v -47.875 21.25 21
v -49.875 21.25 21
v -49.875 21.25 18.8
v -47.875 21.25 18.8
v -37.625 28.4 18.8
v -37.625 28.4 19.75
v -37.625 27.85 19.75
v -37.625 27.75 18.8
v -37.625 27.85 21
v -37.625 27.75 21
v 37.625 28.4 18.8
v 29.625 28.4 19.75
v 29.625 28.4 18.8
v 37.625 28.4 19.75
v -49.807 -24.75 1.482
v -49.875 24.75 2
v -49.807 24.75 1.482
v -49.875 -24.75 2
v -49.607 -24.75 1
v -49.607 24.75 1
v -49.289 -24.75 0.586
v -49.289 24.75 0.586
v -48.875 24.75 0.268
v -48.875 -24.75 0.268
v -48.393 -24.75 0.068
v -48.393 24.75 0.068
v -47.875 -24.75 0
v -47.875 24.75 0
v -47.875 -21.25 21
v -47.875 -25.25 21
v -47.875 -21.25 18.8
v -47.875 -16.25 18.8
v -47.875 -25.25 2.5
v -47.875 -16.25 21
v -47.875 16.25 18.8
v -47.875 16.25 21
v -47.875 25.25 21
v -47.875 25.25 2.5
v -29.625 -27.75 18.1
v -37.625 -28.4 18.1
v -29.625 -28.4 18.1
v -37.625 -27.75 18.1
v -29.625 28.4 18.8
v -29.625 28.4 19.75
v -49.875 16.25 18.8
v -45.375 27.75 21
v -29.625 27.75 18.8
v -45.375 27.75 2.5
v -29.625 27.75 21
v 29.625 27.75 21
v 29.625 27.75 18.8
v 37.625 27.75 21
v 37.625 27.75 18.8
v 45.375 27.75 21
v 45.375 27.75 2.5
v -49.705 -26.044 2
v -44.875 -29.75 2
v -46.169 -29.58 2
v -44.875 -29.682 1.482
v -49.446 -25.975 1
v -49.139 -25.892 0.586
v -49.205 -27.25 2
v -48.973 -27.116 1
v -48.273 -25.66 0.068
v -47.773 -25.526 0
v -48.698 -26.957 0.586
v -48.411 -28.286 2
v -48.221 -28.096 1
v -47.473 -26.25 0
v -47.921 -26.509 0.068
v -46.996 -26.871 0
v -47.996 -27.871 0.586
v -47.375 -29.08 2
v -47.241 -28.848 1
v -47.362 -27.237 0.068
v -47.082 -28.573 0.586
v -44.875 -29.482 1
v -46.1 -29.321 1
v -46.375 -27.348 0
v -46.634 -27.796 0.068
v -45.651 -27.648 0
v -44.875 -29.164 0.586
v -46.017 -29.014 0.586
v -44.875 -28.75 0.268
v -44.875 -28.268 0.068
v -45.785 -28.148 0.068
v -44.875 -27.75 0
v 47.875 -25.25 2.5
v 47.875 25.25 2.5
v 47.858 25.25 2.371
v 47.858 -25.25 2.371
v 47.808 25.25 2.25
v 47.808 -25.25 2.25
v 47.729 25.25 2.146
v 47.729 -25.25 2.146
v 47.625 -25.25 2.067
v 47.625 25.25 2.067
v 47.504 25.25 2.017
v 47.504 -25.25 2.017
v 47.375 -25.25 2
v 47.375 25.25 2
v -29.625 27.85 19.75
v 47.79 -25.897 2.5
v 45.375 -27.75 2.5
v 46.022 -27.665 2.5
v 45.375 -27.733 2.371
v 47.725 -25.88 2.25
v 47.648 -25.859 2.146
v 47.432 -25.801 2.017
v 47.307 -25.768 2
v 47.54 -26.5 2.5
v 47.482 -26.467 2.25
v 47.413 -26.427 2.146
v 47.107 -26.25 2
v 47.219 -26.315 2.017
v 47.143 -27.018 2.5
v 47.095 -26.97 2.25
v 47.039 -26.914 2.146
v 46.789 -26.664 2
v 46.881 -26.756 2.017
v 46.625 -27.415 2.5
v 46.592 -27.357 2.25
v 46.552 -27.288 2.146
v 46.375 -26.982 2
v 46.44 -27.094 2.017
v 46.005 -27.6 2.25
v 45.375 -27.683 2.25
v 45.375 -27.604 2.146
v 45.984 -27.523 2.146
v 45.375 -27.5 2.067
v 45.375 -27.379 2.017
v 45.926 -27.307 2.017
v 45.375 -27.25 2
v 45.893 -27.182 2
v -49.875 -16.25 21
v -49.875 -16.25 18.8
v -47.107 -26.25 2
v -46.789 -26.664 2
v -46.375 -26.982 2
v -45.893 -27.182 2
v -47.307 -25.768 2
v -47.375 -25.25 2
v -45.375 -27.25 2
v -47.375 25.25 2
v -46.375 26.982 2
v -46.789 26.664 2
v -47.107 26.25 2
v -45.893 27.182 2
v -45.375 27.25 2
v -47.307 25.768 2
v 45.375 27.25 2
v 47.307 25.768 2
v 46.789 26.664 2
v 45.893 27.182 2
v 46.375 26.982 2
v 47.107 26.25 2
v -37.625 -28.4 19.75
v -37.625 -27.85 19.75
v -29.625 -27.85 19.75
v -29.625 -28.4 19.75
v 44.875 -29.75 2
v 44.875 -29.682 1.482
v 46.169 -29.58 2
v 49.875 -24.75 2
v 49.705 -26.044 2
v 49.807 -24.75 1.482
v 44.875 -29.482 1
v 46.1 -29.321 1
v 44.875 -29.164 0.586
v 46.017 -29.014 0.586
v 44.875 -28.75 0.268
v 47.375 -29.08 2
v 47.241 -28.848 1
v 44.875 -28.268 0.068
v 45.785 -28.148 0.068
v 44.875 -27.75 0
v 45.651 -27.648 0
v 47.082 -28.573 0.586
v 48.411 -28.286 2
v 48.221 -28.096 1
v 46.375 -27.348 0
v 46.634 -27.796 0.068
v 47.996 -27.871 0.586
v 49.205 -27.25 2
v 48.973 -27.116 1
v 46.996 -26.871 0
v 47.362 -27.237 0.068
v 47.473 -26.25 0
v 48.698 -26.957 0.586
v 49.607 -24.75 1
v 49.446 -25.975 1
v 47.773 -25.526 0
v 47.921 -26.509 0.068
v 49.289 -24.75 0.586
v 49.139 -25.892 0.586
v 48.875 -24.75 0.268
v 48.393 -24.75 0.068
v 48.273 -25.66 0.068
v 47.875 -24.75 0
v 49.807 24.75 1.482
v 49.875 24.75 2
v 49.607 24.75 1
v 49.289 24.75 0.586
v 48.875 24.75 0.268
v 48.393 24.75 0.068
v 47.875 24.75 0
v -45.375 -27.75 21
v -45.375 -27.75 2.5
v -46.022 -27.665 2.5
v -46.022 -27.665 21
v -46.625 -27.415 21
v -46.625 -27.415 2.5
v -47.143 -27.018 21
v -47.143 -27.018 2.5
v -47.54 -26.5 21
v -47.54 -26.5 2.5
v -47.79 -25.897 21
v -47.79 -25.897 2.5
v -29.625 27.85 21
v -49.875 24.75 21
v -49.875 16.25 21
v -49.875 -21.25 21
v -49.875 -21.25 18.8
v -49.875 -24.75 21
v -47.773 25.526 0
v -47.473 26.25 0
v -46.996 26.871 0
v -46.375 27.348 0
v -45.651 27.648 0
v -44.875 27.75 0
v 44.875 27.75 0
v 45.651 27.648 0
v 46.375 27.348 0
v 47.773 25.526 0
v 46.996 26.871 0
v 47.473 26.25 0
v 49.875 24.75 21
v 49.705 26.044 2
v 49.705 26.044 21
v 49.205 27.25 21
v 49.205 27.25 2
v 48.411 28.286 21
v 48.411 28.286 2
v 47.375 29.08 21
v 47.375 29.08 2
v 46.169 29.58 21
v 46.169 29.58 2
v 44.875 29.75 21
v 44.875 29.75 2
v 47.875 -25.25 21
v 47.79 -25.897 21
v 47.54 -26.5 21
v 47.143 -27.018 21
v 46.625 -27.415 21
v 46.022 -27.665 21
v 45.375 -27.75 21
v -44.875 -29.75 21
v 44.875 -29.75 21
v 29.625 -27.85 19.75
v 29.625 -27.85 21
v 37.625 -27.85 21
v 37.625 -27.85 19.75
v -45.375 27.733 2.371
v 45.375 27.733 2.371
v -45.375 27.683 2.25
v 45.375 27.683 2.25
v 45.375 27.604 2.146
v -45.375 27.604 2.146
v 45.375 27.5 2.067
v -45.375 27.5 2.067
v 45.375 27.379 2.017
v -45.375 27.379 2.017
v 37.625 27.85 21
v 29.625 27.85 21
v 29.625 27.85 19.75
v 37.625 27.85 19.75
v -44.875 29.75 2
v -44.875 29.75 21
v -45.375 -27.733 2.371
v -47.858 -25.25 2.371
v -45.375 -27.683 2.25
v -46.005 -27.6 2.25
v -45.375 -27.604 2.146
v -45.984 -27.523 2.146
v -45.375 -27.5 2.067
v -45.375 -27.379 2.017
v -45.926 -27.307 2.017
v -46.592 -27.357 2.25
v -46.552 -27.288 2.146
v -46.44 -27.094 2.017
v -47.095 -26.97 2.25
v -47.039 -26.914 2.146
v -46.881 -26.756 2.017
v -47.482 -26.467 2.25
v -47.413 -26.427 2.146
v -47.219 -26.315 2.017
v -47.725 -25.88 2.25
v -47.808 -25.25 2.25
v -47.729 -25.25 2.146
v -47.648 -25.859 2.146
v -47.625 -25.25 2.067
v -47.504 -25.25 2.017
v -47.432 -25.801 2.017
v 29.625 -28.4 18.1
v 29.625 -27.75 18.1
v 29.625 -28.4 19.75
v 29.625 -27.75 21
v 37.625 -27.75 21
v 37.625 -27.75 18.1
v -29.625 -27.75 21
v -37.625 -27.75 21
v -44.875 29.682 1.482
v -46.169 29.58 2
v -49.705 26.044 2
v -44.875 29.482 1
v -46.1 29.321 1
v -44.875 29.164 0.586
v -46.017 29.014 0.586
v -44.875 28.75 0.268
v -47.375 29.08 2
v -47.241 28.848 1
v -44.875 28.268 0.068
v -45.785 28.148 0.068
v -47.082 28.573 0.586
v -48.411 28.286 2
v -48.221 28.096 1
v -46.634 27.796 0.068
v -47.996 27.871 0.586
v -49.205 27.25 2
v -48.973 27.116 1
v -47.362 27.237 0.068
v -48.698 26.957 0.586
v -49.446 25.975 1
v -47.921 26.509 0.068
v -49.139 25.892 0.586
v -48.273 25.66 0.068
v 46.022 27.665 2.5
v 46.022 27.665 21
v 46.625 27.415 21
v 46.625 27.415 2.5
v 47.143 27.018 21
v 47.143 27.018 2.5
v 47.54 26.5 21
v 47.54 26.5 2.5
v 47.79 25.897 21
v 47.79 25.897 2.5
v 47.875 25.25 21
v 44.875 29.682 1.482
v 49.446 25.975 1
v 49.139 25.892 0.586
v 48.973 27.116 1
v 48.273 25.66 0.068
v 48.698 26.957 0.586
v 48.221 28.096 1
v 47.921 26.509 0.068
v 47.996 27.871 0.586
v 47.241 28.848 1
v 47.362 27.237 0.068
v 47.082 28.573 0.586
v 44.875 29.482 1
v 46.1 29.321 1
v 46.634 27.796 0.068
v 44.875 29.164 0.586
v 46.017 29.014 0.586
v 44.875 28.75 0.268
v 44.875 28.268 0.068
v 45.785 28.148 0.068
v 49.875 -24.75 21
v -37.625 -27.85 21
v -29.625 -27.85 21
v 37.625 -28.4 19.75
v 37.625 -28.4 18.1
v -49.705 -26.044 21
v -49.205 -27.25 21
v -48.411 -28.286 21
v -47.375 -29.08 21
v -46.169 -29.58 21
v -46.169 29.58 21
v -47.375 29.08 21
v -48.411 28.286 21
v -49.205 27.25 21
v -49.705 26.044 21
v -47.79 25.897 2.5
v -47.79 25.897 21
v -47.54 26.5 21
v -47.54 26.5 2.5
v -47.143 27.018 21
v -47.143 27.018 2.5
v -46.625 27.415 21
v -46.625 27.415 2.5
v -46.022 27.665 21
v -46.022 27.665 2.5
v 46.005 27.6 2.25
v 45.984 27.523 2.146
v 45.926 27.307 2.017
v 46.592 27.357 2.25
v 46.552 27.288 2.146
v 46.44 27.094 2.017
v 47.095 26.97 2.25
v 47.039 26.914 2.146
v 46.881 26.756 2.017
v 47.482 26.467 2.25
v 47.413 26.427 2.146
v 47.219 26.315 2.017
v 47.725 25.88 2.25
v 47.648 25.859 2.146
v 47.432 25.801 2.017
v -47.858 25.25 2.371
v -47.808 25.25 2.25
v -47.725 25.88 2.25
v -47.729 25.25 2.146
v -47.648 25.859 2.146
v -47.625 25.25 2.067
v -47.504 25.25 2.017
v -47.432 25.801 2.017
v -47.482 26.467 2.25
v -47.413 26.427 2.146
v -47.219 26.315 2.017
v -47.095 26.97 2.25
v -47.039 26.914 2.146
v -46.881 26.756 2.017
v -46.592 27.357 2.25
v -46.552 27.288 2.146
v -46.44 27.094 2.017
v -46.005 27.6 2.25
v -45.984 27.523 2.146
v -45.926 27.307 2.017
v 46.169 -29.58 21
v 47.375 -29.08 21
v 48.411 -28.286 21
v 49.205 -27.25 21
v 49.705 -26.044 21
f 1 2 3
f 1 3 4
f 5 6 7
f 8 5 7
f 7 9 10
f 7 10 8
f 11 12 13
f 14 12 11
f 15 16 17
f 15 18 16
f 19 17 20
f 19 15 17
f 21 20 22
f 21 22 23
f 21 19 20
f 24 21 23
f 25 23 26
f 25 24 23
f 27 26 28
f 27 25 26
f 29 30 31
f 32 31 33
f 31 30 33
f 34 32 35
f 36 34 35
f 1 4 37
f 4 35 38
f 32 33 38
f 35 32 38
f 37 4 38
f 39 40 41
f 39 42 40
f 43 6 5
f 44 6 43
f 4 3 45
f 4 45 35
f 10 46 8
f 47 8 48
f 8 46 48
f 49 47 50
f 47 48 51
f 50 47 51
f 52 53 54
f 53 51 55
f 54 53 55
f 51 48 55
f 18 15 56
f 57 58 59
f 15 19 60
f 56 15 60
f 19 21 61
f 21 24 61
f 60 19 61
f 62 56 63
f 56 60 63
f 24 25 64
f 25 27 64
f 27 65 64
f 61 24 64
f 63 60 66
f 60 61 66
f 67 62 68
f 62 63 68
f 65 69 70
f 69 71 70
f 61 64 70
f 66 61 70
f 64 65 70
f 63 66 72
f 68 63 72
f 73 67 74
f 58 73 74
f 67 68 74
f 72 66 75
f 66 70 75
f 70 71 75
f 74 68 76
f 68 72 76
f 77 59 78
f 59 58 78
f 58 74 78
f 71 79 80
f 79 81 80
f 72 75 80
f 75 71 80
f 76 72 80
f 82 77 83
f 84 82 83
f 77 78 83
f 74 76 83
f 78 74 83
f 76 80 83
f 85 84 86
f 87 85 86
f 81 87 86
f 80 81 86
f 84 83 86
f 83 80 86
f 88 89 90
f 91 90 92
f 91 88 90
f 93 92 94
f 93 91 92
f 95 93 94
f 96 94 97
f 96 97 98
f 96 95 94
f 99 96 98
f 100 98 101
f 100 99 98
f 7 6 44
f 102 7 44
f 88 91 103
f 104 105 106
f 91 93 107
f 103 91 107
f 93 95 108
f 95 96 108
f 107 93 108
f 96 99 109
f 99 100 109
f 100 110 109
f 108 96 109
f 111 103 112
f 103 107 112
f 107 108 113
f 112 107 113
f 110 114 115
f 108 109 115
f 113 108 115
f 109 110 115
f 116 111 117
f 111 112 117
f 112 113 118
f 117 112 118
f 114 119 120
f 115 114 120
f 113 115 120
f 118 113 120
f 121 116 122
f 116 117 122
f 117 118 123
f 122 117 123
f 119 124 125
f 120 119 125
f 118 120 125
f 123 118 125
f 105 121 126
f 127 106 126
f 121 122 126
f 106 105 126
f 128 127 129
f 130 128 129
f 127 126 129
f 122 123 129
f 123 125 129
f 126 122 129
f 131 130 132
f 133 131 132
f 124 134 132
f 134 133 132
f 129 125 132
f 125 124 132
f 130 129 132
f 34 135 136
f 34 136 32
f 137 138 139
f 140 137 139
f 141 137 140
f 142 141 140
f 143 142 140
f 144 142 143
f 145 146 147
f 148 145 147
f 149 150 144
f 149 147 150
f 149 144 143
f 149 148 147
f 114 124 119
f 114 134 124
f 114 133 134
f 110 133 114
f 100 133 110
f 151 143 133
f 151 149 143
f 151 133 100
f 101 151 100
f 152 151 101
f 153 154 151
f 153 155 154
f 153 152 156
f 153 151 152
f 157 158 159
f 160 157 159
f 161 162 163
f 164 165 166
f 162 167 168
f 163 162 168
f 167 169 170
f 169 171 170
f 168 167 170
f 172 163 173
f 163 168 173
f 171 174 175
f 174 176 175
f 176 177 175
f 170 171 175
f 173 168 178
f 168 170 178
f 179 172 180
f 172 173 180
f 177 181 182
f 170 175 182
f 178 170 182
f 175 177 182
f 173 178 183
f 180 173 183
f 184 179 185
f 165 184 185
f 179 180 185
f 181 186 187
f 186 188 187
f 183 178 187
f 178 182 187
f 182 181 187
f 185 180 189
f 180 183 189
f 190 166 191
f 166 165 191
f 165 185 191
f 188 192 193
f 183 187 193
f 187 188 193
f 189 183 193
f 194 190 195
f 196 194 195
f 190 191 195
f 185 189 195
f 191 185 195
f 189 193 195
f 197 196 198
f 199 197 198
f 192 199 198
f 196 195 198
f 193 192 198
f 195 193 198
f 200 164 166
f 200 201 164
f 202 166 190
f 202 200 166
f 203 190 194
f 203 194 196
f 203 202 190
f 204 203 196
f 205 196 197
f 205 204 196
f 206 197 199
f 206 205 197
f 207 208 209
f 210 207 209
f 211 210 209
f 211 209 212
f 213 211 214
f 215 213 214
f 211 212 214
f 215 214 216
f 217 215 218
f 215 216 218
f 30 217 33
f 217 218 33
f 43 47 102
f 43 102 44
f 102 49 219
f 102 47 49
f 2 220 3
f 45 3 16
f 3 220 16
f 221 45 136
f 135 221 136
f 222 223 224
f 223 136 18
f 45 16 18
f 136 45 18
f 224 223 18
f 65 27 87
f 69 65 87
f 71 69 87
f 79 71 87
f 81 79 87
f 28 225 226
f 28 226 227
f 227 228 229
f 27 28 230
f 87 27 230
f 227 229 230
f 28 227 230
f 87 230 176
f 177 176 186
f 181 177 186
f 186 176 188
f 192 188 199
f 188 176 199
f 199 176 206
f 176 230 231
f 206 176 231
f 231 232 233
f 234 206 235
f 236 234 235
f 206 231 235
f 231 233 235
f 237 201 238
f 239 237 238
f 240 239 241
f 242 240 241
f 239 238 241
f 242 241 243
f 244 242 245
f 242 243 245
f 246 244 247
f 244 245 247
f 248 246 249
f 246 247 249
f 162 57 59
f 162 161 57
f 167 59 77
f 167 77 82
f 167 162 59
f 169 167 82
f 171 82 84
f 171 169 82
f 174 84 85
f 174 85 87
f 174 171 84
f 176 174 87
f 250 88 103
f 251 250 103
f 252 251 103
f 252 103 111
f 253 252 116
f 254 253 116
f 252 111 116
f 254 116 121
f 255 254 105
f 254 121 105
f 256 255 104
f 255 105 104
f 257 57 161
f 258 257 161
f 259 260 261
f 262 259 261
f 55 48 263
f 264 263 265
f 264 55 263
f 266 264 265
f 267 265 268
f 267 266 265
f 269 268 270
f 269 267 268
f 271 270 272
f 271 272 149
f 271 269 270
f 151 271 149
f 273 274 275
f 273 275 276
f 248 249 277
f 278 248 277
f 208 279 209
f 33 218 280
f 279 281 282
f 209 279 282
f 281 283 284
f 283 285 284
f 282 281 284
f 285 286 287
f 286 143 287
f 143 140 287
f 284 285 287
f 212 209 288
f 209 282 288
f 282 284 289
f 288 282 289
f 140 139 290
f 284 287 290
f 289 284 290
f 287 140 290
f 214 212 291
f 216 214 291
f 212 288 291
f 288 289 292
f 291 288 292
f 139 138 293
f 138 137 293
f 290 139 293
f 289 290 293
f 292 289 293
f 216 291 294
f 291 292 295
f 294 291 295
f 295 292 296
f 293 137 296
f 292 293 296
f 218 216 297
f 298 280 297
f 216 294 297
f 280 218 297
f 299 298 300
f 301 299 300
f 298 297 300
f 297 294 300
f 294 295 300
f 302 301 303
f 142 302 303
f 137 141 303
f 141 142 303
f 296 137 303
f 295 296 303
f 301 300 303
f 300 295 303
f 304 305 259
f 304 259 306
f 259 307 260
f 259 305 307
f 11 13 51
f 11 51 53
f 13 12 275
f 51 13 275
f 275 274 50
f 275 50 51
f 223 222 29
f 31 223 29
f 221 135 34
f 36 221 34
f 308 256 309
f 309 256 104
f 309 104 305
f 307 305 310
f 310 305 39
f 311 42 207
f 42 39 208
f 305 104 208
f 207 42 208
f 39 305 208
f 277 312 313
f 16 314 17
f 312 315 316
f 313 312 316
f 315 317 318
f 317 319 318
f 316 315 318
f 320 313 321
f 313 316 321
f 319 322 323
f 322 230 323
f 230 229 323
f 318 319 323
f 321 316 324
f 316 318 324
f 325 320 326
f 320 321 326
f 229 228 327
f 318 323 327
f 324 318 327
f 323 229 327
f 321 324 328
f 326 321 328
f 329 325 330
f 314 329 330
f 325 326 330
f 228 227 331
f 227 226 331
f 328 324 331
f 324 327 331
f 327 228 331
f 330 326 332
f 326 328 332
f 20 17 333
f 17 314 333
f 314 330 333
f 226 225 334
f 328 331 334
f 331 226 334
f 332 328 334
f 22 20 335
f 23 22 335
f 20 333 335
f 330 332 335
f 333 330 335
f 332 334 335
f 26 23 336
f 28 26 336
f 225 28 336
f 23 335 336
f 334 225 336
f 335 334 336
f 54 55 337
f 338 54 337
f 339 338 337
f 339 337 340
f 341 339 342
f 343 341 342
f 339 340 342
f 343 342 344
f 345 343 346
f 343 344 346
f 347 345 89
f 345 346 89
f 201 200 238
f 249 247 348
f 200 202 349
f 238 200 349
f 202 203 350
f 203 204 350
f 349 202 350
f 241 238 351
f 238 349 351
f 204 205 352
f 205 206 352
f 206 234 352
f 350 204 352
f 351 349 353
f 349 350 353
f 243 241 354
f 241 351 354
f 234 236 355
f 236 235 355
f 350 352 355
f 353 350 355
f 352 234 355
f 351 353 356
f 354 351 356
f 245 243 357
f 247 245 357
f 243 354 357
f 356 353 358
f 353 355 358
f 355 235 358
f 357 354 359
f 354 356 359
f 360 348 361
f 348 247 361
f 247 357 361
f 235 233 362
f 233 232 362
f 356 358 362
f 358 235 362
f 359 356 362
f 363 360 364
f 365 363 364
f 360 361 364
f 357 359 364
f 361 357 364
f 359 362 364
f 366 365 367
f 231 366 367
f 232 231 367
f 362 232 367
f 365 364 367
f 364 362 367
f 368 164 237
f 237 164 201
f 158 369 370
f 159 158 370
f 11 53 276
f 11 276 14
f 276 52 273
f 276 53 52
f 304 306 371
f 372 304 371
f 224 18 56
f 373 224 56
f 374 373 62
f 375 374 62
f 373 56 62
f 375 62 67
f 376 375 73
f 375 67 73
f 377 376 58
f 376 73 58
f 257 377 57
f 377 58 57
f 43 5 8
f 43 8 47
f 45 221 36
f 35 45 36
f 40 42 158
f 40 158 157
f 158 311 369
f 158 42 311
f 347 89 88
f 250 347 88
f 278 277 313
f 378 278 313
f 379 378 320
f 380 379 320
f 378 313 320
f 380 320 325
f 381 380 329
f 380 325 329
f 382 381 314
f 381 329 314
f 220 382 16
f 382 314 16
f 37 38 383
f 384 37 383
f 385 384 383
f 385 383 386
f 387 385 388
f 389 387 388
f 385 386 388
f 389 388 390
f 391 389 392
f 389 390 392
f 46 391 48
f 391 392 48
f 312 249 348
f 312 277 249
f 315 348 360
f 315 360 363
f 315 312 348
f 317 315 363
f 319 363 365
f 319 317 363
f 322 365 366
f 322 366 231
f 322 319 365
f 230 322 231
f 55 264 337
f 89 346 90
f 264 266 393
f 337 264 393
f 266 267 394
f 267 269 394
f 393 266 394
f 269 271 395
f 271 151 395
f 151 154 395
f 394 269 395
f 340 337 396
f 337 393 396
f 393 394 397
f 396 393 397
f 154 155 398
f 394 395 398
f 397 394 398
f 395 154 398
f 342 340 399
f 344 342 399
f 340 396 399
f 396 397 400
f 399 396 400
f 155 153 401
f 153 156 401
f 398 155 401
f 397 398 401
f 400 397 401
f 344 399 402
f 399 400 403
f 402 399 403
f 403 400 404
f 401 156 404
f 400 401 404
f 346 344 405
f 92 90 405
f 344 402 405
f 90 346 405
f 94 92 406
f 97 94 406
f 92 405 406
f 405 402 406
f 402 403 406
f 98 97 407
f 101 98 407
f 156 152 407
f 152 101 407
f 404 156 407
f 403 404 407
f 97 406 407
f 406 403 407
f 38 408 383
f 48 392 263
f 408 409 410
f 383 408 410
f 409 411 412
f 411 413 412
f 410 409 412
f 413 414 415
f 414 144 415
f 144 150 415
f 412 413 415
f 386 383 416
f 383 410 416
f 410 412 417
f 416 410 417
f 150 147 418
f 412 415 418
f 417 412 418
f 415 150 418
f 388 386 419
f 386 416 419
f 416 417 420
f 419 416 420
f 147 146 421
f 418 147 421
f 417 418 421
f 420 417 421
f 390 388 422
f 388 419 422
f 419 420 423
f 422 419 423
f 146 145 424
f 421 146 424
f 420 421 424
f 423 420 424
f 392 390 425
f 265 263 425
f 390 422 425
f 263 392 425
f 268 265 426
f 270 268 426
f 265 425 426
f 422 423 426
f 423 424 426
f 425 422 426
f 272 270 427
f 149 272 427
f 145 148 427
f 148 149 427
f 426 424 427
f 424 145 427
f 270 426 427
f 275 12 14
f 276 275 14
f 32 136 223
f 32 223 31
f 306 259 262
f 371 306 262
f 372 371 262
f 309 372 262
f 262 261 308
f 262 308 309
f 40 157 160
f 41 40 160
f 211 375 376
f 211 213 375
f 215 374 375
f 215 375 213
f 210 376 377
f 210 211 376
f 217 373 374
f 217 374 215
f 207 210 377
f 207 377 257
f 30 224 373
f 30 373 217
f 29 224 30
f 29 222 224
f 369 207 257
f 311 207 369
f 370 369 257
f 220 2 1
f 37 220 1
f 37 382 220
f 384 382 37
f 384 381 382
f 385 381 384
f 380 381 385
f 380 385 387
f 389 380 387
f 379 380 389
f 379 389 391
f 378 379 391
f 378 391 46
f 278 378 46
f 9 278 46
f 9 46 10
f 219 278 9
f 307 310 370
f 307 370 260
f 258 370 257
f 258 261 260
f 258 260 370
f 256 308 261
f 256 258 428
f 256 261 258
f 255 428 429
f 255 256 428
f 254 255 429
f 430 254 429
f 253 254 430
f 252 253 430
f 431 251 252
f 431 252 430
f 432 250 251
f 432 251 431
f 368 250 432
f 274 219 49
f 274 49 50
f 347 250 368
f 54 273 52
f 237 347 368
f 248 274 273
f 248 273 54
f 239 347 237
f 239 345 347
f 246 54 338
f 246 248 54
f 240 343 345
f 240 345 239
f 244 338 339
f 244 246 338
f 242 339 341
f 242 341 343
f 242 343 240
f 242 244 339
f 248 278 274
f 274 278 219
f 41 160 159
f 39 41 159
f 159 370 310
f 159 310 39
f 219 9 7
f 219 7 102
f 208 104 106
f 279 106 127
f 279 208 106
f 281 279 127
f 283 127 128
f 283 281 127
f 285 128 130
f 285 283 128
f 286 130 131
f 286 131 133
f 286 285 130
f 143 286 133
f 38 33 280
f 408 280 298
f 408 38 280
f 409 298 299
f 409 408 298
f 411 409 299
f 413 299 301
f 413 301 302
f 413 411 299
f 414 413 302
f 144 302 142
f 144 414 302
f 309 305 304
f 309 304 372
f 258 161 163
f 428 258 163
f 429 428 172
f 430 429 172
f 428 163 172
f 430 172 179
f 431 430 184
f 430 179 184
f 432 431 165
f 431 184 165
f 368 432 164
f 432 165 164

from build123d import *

# Parameters (mm, degrees)
F1_DEPTH = 2
F2_DEPTH = 21
F3_R     = 2
F4_W     = 2
F4_H     = 5
F4_W_2   = 8
F4_H_2   = 0.55
F4_H_3   = 0.1
F5_DEPTH = 2.2
F6_R     = 0.5
F7_DEPTH = 2.9
F8_DEPTH = 1.25


with BuildPart() as f1:
    # F0 (on Top) → F1 (new body)
    with BuildSketch(Plane.XY):
        with BuildLine():
            Line((-44.875, -29.75), (44.875, -29.75))
            ThreePointArc((44.875, -29.75), (48.4105339059, -28.2855339059), (49.875, -24.75))
            Line((49.875, -24.75), (49.875, 24.75))
            ThreePointArc((49.875, 24.75), (48.4105339059, 28.2855339059), (44.875, 29.75))
            Line((44.875, 29.75), (-44.875, 29.75))
            ThreePointArc((-44.875, 29.75), (-48.4105339059, 28.2855339059), (-49.875, 24.75))
            Line((-49.875, 24.75), (-49.875, -24.75))
            ThreePointArc((-49.875, -24.75), (-48.4105339059, -28.2855339059), (-44.875, -29.75))
        make_face()
        with BuildLine():
            ThreePointArc((47.875, -25.25), (47.142766953, -27.017766953), (45.375, -27.75))
            Line((45.375, -27.75), (-45.375, -27.75))
            ThreePointArc((-45.375, -27.75), (-47.142766953, -27.017766953), (-47.875, -25.25))
            Line((-47.875, -25.25), (-47.875, 25.25))
            ThreePointArc((-47.875, 25.25), (-47.142766953, 27.017766953), (-45.375, 27.75))
            Line((-45.375, 27.75), (45.375, 27.75))
            ThreePointArc((45.375, 27.75), (47.142766953, 27.017766953), (47.875, 25.25))
            Line((47.875, 25.25), (47.875, -25.25))
        make_face(mode=Mode.SUBTRACT)
        with BuildLine():
            Line((-45.375, -27.75), (45.375, -27.75))
            ThreePointArc((45.375, -27.75), (47.142766953, -27.017766953), (47.875, -25.25))
            Line((47.875, -25.25), (47.875, 25.25))
            ThreePointArc((47.875, 25.25), (47.142766953, 27.017766953), (45.375, 27.75))
            Line((45.375, 27.75), (-45.375, 27.75))
            ThreePointArc((-45.375, 27.75), (-47.142766953, 27.017766953), (-47.875, 25.25))
            Line((-47.875, 25.25), (-47.875, -25.25))
            ThreePointArc((-47.875, -25.25), (-47.142766953, -27.017766953), (-45.375, -27.75))
        make_face()
    extrude(amount=F1_DEPTH)

    # F0 (on Top) → F2 (join)
    with BuildSketch(Plane.XY):
        with BuildLine():
            Line((-44.875, -29.75), (44.875, -29.75))
            ThreePointArc((44.875, -29.75), (48.4105339059, -28.2855339059), (49.875, -24.75))
            Line((49.875, -24.75), (49.875, 24.75))
            ThreePointArc((49.875, 24.75), (48.4105339059, 28.2855339059), (44.875, 29.75))
            Line((44.875, 29.75), (-44.875, 29.75))
            ThreePointArc((-44.875, 29.75), (-48.4105339059, 28.2855339059), (-49.875, 24.75))
            Line((-49.875, 24.75), (-49.875, -24.75))
            ThreePointArc((-49.875, -24.75), (-48.4105339059, -28.2855339059), (-44.875, -29.75))
        make_face()
        with BuildLine():
            ThreePointArc((47.875, -25.25), (47.142766953, -27.017766953), (45.375, -27.75))
            Line((45.375, -27.75), (-45.375, -27.75))
            ThreePointArc((-45.375, -27.75), (-47.142766953, -27.017766953), (-47.875, -25.25))
            Line((-47.875, -25.25), (-47.875, 25.25))
            ThreePointArc((-47.875, 25.25), (-47.142766953, 27.017766953), (-45.375, 27.75))
            Line((-45.375, 27.75), (45.375, 27.75))
            ThreePointArc((45.375, 27.75), (47.142766953, 27.017766953), (47.875, 25.25))
            Line((47.875, 25.25), (47.875, -25.25))
        make_face(mode=Mode.SUBTRACT)
    extrude(amount=F2_DEPTH)

    # F3
    f3_edges = [f1.edges().sort_by_distance(p)[0] for p in [
        (0, -29.75, 0),
        (-48.410534, -28.285534, 0),
        (-49.875, 0, 0),
        (-48.410534, 28.285534, 0),
        (0, 29.75, 0),
        (48.410534, 28.285534, 0),
        (49.875, 0, 0),
        (48.410534, -28.285534, 0),
    ]]
    fillet(f3_edges, radius=F3_R)

    # F4 (on face) → F5 (cut)
    with BuildSketch(Plane.XY.offset(21)):
        with Locations((-48.875, -18.75)):
            Rectangle(F4_W, F4_H)
        with Locations((-48.875, 18.75)):
            Rectangle(F4_W, F4_H)
        with Locations((-33.625, 28.125)):
            Rectangle(F4_W_2, F4_H_2)
        with Locations((-33.625, 27.8)):
            Rectangle(F4_W_2, F4_H_3)
        with Locations((33.625, 28.125)):
            Rectangle(F4_W_2, F4_H_2)
        with Locations((33.625, 27.8)):
            Rectangle(F4_W_2, F4_H_3)
    extrude(amount=-F5_DEPTH, mode=Mode.SUBTRACT)

    # F6
    f6_edges = [f1.edges().sort_by_distance(p)[0] for p in [
        (47.142767, 27.017767, 2),
        (47.875, 0, 2),
        (47.142767, -27.017767, 2),
        (0, -27.75, 2),
        (-47.142767, -27.017767, 2),
        (-47.875, 0, 2),
        (-47.142767, 27.017767, 2),
        (0, 27.75, 2),
    ]]
    fillet(f6_edges, radius=F6_R)

    # F4 (on face) → F7 (cut)
    with BuildSketch(Plane.XY.offset(21)):
        with Locations((-33.625, -28.125)):
            Rectangle(F4_W_2, F4_H_2)
        with Locations((-33.625, -27.8)):
            Rectangle(F4_W_2, F4_H_3)
        with Locations((33.625, -27.8)):
            Rectangle(F4_W_2, F4_H_3)
        with Locations((33.625, -28.125)):
            Rectangle(F4_W_2, F4_H_2)
    extrude(amount=-F7_DEPTH, mode=Mode.SUBTRACT)

    # F4 (on face) → F8 (join)
    with BuildSketch(Plane.XY.offset(21)):
        with Locations((33.625, 28.125)):
            Rectangle(F4_W_2, F4_H_2)
        with Locations((-33.625, 28.125)):
            Rectangle(F4_W_2, F4_H_2)
        with Locations((-33.625, -28.125)):
            Rectangle(F4_W_2, F4_H_2)
        with Locations((33.625, -28.125)):
            Rectangle(F4_W_2, F4_H_2)
    extrude(amount=-F8_DEPTH)


solid = f1.part
